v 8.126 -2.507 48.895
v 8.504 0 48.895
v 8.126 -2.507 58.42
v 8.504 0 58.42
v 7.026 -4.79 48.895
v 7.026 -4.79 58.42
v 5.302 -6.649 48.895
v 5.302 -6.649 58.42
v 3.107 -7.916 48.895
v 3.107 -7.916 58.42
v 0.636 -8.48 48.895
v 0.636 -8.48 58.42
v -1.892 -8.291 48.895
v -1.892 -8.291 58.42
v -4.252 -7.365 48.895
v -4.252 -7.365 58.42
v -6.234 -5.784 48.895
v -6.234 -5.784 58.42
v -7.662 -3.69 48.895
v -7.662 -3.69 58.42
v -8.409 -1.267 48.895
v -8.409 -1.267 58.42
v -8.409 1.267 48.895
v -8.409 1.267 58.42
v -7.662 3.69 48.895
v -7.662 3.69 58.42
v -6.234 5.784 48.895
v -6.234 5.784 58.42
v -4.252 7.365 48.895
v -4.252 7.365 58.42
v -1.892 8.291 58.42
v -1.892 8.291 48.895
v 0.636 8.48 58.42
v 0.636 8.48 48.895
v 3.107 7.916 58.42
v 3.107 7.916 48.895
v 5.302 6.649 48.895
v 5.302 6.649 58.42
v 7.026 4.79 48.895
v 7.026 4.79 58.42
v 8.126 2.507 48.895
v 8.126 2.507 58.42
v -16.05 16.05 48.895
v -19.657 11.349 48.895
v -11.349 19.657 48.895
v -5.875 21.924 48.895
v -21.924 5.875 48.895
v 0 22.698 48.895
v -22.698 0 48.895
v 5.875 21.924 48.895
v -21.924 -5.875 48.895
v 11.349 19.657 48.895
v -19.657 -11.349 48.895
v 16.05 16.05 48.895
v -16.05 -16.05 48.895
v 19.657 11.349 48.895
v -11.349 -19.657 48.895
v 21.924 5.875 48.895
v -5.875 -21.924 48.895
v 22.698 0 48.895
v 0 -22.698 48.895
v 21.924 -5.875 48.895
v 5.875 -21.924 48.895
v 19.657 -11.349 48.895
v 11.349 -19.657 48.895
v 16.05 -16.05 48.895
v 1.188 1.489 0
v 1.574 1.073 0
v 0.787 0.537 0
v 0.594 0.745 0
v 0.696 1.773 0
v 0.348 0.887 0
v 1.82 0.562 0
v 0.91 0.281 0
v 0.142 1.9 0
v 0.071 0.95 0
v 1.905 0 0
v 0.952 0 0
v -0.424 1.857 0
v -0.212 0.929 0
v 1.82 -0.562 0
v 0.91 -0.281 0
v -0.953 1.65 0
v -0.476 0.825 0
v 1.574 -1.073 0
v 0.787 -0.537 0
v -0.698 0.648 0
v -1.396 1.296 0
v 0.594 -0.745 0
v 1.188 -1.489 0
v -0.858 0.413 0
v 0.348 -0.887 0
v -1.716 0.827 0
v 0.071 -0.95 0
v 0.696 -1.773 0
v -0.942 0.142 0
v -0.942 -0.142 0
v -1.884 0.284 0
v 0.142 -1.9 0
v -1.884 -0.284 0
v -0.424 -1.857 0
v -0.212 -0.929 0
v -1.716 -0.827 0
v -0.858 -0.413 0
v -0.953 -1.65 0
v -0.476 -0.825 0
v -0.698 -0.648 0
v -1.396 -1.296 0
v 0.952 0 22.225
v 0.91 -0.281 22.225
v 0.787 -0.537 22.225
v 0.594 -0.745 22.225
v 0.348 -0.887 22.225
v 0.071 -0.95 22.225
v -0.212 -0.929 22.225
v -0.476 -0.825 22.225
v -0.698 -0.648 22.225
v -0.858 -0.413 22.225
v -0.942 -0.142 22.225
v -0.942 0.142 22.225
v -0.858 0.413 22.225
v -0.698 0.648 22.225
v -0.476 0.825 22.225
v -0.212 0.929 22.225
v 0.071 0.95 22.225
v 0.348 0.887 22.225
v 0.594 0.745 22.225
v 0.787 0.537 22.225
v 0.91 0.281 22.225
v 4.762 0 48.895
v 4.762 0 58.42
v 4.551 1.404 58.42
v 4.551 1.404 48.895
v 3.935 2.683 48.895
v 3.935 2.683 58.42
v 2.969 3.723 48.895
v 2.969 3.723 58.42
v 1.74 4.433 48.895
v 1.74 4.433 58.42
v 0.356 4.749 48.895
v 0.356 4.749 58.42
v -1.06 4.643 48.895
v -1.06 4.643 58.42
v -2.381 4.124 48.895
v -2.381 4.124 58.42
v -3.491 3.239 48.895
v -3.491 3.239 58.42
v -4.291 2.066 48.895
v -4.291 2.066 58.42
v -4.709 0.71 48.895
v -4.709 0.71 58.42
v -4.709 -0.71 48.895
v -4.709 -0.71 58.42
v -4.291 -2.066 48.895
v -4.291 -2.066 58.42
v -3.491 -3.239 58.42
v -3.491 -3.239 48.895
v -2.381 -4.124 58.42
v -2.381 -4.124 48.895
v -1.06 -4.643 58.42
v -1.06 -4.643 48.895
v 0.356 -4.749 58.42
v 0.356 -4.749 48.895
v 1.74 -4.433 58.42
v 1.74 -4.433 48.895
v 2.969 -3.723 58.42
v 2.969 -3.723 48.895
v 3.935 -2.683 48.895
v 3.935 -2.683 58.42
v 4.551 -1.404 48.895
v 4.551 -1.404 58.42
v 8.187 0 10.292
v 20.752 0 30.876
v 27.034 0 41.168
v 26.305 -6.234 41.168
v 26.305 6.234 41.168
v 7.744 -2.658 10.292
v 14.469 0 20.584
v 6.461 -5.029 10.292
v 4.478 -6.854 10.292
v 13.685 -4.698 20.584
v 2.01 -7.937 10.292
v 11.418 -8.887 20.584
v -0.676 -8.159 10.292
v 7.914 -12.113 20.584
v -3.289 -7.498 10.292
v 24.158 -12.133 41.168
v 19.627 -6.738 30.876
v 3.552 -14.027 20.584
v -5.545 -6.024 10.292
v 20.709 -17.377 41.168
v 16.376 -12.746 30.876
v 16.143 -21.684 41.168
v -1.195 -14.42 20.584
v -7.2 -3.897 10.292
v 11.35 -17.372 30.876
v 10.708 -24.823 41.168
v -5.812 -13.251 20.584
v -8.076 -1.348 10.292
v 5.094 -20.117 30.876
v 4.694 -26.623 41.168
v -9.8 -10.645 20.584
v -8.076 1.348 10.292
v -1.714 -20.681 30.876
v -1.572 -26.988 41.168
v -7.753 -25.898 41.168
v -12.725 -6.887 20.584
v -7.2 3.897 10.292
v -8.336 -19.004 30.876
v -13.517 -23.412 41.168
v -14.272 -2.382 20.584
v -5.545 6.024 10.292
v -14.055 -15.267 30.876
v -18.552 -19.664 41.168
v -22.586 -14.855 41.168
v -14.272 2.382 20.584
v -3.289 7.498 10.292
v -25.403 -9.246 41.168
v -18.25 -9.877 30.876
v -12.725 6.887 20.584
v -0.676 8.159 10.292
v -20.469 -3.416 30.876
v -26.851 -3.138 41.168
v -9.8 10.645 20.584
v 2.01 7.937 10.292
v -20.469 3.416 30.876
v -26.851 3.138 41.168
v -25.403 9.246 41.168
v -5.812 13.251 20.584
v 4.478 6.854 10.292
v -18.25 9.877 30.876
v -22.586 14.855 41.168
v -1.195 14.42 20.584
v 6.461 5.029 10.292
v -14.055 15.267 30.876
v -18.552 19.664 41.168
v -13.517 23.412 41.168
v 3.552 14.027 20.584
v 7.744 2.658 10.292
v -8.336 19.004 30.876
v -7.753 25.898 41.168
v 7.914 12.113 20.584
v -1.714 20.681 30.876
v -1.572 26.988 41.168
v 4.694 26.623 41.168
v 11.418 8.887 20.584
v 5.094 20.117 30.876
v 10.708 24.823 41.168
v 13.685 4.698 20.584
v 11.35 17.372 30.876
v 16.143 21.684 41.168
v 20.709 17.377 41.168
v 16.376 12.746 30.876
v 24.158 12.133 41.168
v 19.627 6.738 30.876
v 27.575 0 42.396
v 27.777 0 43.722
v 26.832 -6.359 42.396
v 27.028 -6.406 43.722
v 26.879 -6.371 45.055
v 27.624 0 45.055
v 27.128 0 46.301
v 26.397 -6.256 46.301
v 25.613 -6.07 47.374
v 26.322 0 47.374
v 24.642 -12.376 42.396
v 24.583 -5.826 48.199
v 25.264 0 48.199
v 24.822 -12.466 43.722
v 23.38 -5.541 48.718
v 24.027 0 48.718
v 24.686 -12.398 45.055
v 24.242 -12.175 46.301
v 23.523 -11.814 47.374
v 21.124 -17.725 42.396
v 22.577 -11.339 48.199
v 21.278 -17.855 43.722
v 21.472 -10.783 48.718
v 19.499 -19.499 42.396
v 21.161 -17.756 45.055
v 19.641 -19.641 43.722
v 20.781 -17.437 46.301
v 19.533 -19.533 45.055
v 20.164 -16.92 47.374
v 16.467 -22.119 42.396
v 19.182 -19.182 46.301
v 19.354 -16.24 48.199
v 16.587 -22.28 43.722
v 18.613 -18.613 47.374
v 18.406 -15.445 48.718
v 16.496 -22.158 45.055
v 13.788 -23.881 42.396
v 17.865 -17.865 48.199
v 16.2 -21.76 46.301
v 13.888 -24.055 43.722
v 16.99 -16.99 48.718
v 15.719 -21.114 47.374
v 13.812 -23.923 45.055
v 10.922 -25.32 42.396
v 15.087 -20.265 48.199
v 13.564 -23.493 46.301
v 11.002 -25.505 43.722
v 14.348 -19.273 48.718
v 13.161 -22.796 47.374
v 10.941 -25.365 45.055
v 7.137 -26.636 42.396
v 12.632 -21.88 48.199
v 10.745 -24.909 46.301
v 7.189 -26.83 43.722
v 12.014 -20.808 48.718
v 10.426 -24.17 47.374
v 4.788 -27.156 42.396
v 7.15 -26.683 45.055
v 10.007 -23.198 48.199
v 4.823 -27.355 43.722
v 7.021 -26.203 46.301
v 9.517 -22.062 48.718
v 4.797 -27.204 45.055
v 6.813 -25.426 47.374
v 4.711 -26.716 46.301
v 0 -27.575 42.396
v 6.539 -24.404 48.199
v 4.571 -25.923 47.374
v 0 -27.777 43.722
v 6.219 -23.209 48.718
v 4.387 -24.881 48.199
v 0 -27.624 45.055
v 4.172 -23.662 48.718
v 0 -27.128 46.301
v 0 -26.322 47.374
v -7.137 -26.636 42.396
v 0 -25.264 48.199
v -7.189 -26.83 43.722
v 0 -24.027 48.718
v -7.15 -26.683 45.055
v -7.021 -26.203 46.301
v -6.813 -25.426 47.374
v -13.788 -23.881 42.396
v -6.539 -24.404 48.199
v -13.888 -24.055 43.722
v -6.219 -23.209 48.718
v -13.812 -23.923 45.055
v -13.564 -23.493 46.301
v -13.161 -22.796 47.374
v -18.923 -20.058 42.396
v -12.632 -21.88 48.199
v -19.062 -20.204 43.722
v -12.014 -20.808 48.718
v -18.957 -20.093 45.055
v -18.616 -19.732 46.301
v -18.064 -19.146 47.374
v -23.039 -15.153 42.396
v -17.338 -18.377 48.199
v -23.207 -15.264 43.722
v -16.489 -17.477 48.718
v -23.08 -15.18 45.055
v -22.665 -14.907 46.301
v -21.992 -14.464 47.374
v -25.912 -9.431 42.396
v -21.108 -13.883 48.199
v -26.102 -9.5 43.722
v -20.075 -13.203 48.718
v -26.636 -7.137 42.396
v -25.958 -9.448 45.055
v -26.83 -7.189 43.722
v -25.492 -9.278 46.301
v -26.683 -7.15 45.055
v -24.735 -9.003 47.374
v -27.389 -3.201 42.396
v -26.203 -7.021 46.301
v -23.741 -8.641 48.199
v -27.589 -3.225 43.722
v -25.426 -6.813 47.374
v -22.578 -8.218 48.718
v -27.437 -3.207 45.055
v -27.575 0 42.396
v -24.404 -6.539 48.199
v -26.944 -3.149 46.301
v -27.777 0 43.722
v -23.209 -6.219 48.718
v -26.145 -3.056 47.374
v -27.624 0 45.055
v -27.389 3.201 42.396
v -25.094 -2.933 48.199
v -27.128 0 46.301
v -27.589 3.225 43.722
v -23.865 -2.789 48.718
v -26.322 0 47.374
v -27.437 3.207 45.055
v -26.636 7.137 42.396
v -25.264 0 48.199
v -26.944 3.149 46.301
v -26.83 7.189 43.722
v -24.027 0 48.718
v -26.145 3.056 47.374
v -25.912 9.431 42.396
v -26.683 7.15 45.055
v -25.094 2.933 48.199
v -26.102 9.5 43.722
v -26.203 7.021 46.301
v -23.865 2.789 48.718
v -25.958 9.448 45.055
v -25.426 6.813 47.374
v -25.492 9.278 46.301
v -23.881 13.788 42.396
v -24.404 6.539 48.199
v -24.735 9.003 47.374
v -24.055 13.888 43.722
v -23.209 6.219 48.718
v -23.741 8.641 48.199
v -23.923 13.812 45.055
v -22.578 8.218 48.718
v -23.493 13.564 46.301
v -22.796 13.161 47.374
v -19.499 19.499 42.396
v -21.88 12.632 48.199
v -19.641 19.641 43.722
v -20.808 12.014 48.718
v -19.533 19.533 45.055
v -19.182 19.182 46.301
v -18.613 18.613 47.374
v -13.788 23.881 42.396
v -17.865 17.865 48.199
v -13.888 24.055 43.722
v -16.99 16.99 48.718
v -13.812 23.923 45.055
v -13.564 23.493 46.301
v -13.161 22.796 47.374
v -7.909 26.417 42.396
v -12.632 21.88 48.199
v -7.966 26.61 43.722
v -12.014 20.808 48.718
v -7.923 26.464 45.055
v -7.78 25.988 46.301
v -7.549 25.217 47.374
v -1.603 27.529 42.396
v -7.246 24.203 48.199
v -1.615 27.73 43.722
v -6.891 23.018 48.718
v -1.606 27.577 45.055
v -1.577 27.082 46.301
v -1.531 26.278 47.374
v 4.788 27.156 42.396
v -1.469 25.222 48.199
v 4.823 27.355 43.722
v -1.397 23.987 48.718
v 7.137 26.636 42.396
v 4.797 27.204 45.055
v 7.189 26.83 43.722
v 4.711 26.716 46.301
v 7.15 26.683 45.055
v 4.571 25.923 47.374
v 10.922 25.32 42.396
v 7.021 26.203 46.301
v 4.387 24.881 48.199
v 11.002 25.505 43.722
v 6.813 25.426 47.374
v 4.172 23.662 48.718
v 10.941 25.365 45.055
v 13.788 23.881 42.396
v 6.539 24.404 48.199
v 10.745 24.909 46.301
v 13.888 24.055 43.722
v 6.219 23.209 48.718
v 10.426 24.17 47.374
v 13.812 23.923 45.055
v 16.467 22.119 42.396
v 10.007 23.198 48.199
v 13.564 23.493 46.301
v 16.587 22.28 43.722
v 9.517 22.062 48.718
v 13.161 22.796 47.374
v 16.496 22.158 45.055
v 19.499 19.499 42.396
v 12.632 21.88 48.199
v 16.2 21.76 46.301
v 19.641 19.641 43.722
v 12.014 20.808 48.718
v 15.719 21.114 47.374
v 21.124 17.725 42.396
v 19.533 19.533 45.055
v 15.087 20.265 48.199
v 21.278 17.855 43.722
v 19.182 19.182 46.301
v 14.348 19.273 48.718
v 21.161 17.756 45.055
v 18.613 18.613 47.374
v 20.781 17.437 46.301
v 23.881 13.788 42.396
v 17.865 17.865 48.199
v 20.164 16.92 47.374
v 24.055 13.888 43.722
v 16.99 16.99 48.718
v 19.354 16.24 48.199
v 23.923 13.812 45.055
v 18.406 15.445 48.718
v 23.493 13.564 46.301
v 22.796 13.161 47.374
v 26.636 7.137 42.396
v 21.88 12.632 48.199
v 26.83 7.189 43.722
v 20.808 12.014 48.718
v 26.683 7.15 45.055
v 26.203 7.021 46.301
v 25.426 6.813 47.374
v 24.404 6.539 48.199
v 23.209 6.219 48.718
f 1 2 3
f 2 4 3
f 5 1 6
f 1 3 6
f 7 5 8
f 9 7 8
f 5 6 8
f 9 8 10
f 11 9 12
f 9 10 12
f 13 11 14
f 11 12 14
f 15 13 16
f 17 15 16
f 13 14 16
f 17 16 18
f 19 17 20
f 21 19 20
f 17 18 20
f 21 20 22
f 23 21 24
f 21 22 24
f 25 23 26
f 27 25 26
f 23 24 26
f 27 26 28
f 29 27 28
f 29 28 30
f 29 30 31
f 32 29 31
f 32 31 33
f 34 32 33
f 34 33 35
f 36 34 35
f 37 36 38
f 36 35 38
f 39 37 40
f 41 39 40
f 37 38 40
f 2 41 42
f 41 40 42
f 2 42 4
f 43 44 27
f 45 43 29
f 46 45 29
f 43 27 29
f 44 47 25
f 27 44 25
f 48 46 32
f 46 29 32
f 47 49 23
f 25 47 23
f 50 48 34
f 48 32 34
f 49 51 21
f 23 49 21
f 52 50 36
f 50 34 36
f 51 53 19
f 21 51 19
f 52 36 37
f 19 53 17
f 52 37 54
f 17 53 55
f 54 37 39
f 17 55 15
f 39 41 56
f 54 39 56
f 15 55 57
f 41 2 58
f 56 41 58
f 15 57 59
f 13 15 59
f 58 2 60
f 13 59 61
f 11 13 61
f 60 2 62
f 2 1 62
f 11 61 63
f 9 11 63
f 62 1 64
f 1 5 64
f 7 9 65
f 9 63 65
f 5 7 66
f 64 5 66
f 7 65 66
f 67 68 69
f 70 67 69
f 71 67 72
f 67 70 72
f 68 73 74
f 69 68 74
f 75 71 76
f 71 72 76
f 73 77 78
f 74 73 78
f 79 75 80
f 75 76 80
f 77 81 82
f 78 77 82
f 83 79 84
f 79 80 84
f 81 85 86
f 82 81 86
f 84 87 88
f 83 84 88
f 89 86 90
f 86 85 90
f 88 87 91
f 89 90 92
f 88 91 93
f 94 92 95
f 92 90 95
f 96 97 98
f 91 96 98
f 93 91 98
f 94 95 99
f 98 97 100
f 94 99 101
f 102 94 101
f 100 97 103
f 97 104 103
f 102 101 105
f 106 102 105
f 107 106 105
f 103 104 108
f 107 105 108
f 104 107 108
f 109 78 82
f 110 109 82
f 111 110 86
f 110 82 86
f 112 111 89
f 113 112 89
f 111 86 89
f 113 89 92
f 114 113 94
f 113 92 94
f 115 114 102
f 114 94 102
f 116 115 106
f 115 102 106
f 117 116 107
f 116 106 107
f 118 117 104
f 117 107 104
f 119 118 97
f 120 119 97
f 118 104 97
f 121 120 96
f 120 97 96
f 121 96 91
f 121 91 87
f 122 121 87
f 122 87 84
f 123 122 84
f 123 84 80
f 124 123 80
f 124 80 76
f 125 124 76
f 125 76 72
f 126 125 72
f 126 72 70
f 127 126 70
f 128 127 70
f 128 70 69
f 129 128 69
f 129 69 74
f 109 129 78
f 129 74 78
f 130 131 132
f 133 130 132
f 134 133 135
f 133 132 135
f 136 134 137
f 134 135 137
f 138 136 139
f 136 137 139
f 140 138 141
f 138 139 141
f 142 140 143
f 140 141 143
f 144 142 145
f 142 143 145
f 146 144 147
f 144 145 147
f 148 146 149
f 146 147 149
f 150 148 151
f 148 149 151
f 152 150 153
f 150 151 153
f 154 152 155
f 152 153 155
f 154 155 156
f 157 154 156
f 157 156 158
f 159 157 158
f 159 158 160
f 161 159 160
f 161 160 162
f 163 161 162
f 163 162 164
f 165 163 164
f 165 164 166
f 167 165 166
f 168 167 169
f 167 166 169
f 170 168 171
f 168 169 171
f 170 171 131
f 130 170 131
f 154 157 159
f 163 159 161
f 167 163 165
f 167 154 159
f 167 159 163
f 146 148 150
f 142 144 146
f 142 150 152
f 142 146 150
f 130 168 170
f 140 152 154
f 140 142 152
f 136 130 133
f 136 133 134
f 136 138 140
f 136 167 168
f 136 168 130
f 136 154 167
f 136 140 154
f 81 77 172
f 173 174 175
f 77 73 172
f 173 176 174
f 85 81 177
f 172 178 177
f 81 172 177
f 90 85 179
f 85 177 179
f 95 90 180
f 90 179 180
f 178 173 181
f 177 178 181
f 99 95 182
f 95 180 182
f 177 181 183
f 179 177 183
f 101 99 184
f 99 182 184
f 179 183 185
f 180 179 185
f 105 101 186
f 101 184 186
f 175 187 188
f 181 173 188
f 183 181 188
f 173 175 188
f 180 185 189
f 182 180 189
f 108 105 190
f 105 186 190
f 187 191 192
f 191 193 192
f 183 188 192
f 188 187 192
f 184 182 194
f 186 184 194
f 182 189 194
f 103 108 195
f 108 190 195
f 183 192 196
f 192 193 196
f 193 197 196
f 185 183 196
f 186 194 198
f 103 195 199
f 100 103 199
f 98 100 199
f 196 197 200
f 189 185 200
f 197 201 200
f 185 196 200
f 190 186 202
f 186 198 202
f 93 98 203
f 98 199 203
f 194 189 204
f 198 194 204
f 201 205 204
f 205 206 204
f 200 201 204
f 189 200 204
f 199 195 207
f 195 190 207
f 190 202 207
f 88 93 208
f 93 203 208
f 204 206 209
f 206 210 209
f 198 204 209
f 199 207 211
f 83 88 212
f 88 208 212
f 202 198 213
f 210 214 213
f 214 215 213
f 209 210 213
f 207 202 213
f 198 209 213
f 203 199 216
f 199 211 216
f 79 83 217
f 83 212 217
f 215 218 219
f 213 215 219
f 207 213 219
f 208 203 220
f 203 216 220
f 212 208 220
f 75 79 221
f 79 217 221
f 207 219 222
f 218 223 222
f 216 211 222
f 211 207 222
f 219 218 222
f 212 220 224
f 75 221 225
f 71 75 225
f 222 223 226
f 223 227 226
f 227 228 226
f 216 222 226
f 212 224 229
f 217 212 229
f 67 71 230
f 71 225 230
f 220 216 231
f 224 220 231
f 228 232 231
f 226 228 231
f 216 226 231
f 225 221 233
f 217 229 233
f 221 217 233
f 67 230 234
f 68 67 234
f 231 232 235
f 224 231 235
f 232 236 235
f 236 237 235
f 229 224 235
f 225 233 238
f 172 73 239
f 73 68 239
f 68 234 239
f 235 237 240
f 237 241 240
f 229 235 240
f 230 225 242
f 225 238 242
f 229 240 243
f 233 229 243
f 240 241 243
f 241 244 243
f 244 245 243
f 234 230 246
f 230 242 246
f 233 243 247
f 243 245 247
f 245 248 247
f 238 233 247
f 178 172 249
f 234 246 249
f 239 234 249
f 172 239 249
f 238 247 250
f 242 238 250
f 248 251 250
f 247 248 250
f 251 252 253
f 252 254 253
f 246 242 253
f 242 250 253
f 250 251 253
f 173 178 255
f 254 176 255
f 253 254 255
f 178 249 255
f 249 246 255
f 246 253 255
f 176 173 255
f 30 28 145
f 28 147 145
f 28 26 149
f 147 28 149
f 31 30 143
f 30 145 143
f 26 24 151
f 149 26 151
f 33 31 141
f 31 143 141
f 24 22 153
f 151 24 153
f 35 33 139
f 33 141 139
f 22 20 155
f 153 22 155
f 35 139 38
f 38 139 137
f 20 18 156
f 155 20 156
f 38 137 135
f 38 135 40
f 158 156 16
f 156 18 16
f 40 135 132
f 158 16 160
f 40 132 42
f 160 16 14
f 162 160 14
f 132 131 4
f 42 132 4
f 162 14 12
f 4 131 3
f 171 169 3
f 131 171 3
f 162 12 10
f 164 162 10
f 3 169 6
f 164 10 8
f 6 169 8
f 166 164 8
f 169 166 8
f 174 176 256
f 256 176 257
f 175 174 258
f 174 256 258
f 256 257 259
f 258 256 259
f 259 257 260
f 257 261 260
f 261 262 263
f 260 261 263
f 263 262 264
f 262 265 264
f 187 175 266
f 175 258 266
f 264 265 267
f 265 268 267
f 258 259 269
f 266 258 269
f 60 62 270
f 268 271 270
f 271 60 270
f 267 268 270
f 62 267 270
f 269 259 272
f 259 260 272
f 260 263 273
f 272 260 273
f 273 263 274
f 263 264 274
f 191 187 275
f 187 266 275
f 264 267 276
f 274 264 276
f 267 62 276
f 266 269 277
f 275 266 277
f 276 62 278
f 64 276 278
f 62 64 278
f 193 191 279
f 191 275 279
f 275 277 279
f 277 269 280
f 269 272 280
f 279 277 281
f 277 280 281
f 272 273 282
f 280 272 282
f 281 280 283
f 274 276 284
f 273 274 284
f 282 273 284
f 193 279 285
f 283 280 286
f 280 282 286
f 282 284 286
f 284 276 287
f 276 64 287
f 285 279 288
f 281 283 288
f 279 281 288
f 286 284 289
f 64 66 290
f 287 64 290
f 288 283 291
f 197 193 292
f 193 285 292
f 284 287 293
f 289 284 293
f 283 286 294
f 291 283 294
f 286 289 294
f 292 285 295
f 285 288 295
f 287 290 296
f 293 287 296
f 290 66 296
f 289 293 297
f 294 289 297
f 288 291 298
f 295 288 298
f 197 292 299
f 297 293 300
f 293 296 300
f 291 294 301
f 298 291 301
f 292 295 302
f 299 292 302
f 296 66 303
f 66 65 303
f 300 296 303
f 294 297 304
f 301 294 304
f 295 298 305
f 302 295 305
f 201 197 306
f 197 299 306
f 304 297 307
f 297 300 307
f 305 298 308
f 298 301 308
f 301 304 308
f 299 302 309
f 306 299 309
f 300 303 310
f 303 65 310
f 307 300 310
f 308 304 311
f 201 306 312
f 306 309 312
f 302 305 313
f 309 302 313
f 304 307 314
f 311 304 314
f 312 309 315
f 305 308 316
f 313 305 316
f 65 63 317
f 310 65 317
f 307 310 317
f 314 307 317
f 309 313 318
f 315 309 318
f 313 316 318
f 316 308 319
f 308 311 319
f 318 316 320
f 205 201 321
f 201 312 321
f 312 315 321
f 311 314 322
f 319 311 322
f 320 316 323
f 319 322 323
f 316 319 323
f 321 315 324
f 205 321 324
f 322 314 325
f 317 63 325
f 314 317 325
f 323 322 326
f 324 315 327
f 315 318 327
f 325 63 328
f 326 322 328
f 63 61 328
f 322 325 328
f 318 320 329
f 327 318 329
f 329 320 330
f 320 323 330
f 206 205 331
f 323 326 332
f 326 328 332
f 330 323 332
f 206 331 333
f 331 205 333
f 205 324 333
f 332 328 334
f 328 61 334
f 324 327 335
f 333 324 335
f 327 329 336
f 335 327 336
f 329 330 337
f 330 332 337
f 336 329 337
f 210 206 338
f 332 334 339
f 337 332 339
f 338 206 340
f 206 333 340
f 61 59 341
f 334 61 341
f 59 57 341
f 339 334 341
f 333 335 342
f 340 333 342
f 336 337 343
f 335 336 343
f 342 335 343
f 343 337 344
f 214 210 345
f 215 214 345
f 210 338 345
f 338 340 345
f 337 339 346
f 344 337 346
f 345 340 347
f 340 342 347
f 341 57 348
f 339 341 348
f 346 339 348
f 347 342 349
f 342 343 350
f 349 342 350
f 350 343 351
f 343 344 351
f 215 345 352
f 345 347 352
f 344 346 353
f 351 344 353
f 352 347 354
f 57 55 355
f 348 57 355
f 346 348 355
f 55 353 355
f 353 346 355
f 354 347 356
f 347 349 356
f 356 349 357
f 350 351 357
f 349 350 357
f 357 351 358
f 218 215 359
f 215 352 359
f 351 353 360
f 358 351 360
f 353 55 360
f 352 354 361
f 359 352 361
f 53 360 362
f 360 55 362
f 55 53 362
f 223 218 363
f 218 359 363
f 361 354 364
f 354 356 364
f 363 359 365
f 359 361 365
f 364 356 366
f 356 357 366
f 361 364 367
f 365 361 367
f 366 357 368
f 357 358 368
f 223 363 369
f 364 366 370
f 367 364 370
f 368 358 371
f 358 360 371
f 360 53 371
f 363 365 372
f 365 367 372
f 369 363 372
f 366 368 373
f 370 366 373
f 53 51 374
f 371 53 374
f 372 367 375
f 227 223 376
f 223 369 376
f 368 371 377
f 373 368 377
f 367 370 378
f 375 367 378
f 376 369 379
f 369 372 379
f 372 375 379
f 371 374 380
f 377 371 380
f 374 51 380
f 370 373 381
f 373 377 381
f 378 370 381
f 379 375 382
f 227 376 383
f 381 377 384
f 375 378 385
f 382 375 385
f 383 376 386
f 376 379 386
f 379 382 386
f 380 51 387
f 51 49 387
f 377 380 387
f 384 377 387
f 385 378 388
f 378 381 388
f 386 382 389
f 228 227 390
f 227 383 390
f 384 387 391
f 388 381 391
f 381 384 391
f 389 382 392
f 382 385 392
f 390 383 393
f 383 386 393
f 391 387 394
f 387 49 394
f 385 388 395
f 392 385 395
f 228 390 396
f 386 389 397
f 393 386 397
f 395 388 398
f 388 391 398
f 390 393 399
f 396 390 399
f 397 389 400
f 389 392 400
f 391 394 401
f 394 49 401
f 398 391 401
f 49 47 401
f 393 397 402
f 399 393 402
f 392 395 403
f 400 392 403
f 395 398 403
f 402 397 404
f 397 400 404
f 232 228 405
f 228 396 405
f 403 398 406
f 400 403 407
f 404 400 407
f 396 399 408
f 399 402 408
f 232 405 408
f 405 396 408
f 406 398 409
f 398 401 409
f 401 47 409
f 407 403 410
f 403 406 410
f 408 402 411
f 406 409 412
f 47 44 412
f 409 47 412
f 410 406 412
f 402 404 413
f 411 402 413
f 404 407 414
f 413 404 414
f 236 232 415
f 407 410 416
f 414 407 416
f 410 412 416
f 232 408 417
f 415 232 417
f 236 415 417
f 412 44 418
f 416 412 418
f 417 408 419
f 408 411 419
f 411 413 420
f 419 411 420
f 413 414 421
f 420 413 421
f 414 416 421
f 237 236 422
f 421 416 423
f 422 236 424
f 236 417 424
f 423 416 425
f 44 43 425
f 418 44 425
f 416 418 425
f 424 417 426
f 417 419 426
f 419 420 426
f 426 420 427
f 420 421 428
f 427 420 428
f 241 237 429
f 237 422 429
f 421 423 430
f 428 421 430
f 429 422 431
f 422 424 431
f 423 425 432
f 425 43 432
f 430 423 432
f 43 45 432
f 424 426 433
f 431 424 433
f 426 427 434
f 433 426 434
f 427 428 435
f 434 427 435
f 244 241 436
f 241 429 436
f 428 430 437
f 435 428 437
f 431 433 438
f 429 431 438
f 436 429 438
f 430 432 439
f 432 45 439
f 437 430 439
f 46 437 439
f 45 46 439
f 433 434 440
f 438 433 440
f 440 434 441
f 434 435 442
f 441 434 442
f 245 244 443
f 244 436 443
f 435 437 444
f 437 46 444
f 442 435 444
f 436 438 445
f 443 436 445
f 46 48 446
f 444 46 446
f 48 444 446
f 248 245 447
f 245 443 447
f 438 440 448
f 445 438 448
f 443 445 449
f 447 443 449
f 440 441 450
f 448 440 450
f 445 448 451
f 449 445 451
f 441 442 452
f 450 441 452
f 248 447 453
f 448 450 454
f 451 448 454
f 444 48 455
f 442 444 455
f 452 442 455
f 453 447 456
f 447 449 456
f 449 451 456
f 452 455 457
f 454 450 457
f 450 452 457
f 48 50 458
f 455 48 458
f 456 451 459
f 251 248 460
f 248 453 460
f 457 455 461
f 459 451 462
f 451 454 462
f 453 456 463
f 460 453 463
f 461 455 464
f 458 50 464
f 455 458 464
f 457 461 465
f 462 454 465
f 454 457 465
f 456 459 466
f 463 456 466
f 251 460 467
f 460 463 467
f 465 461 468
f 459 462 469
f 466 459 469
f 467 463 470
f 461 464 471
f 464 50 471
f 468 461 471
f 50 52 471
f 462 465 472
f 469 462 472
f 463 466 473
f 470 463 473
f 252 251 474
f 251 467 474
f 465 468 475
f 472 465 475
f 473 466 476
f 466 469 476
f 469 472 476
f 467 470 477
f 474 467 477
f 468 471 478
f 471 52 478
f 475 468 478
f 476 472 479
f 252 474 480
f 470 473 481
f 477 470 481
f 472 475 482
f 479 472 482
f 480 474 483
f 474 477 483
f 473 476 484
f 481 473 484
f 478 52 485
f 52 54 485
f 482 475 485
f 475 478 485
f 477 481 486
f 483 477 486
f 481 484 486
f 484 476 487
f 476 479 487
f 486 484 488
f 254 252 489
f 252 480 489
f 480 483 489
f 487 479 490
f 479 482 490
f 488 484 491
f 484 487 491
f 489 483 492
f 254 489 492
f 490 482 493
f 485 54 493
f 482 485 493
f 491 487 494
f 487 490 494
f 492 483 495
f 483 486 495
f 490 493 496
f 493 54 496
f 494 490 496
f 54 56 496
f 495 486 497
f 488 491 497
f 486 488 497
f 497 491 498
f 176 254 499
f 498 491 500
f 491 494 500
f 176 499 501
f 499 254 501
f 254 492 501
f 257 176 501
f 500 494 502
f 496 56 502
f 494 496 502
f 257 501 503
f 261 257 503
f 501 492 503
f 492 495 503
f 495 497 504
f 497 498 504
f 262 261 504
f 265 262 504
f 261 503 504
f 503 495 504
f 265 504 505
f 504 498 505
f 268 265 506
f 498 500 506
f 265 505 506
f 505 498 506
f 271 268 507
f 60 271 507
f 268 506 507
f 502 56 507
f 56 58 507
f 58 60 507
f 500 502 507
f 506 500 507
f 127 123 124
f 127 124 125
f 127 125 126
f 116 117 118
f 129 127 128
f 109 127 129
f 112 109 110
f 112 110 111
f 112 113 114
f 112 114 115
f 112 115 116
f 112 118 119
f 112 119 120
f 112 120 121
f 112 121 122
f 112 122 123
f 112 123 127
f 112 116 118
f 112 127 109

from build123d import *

# Parameters (mm, degrees)
F2_R     = 4.7625
F3_DEPTH = 9.525
F4_R     = 0.9525
F5_DEPTH = 22.225


with BuildPart() as f1:
    # F0 (on Front) → F1 (revolve)
    with BuildSketch(Plane.XZ):
        with BuildLine():
            Line((0, 58.42), (0, 0))
            Line((0, 0), (1.905, 0))
            Line((1.905, 0), (27.03371, 41.168312))
            ThreePointArc((27.03371, 41.168312), (27.127747, 46.301084), (22.697647, 48.895))
            Line((22.697647, 48.895), (8.504043, 48.895))
            Line((8.504043, 48.895), (8.504043, 58.42))
            Line((8.504043, 58.42), (0, 58.42))
        make_face()
    revolve(axis=Axis((0, 0, 29.21), (0, 0, -1)))

    # F2 (on face) → F3 (cut)
    with BuildSketch(Plane.XY.offset(58.42)):
        Circle(F2_R)
    extrude(amount=-F3_DEPTH, mode=Mode.SUBTRACT)

    # F4 (on face) → F5 (cut)
    with BuildSketch(Plane(origin=(0, 0, 0), x_dir=(1, 0, 0), z_dir=(0, 0, -1))):
        Circle(F4_R)
    extrude(amount=-F5_DEPTH, mode=Mode.SUBTRACT)


solid = f1.part
